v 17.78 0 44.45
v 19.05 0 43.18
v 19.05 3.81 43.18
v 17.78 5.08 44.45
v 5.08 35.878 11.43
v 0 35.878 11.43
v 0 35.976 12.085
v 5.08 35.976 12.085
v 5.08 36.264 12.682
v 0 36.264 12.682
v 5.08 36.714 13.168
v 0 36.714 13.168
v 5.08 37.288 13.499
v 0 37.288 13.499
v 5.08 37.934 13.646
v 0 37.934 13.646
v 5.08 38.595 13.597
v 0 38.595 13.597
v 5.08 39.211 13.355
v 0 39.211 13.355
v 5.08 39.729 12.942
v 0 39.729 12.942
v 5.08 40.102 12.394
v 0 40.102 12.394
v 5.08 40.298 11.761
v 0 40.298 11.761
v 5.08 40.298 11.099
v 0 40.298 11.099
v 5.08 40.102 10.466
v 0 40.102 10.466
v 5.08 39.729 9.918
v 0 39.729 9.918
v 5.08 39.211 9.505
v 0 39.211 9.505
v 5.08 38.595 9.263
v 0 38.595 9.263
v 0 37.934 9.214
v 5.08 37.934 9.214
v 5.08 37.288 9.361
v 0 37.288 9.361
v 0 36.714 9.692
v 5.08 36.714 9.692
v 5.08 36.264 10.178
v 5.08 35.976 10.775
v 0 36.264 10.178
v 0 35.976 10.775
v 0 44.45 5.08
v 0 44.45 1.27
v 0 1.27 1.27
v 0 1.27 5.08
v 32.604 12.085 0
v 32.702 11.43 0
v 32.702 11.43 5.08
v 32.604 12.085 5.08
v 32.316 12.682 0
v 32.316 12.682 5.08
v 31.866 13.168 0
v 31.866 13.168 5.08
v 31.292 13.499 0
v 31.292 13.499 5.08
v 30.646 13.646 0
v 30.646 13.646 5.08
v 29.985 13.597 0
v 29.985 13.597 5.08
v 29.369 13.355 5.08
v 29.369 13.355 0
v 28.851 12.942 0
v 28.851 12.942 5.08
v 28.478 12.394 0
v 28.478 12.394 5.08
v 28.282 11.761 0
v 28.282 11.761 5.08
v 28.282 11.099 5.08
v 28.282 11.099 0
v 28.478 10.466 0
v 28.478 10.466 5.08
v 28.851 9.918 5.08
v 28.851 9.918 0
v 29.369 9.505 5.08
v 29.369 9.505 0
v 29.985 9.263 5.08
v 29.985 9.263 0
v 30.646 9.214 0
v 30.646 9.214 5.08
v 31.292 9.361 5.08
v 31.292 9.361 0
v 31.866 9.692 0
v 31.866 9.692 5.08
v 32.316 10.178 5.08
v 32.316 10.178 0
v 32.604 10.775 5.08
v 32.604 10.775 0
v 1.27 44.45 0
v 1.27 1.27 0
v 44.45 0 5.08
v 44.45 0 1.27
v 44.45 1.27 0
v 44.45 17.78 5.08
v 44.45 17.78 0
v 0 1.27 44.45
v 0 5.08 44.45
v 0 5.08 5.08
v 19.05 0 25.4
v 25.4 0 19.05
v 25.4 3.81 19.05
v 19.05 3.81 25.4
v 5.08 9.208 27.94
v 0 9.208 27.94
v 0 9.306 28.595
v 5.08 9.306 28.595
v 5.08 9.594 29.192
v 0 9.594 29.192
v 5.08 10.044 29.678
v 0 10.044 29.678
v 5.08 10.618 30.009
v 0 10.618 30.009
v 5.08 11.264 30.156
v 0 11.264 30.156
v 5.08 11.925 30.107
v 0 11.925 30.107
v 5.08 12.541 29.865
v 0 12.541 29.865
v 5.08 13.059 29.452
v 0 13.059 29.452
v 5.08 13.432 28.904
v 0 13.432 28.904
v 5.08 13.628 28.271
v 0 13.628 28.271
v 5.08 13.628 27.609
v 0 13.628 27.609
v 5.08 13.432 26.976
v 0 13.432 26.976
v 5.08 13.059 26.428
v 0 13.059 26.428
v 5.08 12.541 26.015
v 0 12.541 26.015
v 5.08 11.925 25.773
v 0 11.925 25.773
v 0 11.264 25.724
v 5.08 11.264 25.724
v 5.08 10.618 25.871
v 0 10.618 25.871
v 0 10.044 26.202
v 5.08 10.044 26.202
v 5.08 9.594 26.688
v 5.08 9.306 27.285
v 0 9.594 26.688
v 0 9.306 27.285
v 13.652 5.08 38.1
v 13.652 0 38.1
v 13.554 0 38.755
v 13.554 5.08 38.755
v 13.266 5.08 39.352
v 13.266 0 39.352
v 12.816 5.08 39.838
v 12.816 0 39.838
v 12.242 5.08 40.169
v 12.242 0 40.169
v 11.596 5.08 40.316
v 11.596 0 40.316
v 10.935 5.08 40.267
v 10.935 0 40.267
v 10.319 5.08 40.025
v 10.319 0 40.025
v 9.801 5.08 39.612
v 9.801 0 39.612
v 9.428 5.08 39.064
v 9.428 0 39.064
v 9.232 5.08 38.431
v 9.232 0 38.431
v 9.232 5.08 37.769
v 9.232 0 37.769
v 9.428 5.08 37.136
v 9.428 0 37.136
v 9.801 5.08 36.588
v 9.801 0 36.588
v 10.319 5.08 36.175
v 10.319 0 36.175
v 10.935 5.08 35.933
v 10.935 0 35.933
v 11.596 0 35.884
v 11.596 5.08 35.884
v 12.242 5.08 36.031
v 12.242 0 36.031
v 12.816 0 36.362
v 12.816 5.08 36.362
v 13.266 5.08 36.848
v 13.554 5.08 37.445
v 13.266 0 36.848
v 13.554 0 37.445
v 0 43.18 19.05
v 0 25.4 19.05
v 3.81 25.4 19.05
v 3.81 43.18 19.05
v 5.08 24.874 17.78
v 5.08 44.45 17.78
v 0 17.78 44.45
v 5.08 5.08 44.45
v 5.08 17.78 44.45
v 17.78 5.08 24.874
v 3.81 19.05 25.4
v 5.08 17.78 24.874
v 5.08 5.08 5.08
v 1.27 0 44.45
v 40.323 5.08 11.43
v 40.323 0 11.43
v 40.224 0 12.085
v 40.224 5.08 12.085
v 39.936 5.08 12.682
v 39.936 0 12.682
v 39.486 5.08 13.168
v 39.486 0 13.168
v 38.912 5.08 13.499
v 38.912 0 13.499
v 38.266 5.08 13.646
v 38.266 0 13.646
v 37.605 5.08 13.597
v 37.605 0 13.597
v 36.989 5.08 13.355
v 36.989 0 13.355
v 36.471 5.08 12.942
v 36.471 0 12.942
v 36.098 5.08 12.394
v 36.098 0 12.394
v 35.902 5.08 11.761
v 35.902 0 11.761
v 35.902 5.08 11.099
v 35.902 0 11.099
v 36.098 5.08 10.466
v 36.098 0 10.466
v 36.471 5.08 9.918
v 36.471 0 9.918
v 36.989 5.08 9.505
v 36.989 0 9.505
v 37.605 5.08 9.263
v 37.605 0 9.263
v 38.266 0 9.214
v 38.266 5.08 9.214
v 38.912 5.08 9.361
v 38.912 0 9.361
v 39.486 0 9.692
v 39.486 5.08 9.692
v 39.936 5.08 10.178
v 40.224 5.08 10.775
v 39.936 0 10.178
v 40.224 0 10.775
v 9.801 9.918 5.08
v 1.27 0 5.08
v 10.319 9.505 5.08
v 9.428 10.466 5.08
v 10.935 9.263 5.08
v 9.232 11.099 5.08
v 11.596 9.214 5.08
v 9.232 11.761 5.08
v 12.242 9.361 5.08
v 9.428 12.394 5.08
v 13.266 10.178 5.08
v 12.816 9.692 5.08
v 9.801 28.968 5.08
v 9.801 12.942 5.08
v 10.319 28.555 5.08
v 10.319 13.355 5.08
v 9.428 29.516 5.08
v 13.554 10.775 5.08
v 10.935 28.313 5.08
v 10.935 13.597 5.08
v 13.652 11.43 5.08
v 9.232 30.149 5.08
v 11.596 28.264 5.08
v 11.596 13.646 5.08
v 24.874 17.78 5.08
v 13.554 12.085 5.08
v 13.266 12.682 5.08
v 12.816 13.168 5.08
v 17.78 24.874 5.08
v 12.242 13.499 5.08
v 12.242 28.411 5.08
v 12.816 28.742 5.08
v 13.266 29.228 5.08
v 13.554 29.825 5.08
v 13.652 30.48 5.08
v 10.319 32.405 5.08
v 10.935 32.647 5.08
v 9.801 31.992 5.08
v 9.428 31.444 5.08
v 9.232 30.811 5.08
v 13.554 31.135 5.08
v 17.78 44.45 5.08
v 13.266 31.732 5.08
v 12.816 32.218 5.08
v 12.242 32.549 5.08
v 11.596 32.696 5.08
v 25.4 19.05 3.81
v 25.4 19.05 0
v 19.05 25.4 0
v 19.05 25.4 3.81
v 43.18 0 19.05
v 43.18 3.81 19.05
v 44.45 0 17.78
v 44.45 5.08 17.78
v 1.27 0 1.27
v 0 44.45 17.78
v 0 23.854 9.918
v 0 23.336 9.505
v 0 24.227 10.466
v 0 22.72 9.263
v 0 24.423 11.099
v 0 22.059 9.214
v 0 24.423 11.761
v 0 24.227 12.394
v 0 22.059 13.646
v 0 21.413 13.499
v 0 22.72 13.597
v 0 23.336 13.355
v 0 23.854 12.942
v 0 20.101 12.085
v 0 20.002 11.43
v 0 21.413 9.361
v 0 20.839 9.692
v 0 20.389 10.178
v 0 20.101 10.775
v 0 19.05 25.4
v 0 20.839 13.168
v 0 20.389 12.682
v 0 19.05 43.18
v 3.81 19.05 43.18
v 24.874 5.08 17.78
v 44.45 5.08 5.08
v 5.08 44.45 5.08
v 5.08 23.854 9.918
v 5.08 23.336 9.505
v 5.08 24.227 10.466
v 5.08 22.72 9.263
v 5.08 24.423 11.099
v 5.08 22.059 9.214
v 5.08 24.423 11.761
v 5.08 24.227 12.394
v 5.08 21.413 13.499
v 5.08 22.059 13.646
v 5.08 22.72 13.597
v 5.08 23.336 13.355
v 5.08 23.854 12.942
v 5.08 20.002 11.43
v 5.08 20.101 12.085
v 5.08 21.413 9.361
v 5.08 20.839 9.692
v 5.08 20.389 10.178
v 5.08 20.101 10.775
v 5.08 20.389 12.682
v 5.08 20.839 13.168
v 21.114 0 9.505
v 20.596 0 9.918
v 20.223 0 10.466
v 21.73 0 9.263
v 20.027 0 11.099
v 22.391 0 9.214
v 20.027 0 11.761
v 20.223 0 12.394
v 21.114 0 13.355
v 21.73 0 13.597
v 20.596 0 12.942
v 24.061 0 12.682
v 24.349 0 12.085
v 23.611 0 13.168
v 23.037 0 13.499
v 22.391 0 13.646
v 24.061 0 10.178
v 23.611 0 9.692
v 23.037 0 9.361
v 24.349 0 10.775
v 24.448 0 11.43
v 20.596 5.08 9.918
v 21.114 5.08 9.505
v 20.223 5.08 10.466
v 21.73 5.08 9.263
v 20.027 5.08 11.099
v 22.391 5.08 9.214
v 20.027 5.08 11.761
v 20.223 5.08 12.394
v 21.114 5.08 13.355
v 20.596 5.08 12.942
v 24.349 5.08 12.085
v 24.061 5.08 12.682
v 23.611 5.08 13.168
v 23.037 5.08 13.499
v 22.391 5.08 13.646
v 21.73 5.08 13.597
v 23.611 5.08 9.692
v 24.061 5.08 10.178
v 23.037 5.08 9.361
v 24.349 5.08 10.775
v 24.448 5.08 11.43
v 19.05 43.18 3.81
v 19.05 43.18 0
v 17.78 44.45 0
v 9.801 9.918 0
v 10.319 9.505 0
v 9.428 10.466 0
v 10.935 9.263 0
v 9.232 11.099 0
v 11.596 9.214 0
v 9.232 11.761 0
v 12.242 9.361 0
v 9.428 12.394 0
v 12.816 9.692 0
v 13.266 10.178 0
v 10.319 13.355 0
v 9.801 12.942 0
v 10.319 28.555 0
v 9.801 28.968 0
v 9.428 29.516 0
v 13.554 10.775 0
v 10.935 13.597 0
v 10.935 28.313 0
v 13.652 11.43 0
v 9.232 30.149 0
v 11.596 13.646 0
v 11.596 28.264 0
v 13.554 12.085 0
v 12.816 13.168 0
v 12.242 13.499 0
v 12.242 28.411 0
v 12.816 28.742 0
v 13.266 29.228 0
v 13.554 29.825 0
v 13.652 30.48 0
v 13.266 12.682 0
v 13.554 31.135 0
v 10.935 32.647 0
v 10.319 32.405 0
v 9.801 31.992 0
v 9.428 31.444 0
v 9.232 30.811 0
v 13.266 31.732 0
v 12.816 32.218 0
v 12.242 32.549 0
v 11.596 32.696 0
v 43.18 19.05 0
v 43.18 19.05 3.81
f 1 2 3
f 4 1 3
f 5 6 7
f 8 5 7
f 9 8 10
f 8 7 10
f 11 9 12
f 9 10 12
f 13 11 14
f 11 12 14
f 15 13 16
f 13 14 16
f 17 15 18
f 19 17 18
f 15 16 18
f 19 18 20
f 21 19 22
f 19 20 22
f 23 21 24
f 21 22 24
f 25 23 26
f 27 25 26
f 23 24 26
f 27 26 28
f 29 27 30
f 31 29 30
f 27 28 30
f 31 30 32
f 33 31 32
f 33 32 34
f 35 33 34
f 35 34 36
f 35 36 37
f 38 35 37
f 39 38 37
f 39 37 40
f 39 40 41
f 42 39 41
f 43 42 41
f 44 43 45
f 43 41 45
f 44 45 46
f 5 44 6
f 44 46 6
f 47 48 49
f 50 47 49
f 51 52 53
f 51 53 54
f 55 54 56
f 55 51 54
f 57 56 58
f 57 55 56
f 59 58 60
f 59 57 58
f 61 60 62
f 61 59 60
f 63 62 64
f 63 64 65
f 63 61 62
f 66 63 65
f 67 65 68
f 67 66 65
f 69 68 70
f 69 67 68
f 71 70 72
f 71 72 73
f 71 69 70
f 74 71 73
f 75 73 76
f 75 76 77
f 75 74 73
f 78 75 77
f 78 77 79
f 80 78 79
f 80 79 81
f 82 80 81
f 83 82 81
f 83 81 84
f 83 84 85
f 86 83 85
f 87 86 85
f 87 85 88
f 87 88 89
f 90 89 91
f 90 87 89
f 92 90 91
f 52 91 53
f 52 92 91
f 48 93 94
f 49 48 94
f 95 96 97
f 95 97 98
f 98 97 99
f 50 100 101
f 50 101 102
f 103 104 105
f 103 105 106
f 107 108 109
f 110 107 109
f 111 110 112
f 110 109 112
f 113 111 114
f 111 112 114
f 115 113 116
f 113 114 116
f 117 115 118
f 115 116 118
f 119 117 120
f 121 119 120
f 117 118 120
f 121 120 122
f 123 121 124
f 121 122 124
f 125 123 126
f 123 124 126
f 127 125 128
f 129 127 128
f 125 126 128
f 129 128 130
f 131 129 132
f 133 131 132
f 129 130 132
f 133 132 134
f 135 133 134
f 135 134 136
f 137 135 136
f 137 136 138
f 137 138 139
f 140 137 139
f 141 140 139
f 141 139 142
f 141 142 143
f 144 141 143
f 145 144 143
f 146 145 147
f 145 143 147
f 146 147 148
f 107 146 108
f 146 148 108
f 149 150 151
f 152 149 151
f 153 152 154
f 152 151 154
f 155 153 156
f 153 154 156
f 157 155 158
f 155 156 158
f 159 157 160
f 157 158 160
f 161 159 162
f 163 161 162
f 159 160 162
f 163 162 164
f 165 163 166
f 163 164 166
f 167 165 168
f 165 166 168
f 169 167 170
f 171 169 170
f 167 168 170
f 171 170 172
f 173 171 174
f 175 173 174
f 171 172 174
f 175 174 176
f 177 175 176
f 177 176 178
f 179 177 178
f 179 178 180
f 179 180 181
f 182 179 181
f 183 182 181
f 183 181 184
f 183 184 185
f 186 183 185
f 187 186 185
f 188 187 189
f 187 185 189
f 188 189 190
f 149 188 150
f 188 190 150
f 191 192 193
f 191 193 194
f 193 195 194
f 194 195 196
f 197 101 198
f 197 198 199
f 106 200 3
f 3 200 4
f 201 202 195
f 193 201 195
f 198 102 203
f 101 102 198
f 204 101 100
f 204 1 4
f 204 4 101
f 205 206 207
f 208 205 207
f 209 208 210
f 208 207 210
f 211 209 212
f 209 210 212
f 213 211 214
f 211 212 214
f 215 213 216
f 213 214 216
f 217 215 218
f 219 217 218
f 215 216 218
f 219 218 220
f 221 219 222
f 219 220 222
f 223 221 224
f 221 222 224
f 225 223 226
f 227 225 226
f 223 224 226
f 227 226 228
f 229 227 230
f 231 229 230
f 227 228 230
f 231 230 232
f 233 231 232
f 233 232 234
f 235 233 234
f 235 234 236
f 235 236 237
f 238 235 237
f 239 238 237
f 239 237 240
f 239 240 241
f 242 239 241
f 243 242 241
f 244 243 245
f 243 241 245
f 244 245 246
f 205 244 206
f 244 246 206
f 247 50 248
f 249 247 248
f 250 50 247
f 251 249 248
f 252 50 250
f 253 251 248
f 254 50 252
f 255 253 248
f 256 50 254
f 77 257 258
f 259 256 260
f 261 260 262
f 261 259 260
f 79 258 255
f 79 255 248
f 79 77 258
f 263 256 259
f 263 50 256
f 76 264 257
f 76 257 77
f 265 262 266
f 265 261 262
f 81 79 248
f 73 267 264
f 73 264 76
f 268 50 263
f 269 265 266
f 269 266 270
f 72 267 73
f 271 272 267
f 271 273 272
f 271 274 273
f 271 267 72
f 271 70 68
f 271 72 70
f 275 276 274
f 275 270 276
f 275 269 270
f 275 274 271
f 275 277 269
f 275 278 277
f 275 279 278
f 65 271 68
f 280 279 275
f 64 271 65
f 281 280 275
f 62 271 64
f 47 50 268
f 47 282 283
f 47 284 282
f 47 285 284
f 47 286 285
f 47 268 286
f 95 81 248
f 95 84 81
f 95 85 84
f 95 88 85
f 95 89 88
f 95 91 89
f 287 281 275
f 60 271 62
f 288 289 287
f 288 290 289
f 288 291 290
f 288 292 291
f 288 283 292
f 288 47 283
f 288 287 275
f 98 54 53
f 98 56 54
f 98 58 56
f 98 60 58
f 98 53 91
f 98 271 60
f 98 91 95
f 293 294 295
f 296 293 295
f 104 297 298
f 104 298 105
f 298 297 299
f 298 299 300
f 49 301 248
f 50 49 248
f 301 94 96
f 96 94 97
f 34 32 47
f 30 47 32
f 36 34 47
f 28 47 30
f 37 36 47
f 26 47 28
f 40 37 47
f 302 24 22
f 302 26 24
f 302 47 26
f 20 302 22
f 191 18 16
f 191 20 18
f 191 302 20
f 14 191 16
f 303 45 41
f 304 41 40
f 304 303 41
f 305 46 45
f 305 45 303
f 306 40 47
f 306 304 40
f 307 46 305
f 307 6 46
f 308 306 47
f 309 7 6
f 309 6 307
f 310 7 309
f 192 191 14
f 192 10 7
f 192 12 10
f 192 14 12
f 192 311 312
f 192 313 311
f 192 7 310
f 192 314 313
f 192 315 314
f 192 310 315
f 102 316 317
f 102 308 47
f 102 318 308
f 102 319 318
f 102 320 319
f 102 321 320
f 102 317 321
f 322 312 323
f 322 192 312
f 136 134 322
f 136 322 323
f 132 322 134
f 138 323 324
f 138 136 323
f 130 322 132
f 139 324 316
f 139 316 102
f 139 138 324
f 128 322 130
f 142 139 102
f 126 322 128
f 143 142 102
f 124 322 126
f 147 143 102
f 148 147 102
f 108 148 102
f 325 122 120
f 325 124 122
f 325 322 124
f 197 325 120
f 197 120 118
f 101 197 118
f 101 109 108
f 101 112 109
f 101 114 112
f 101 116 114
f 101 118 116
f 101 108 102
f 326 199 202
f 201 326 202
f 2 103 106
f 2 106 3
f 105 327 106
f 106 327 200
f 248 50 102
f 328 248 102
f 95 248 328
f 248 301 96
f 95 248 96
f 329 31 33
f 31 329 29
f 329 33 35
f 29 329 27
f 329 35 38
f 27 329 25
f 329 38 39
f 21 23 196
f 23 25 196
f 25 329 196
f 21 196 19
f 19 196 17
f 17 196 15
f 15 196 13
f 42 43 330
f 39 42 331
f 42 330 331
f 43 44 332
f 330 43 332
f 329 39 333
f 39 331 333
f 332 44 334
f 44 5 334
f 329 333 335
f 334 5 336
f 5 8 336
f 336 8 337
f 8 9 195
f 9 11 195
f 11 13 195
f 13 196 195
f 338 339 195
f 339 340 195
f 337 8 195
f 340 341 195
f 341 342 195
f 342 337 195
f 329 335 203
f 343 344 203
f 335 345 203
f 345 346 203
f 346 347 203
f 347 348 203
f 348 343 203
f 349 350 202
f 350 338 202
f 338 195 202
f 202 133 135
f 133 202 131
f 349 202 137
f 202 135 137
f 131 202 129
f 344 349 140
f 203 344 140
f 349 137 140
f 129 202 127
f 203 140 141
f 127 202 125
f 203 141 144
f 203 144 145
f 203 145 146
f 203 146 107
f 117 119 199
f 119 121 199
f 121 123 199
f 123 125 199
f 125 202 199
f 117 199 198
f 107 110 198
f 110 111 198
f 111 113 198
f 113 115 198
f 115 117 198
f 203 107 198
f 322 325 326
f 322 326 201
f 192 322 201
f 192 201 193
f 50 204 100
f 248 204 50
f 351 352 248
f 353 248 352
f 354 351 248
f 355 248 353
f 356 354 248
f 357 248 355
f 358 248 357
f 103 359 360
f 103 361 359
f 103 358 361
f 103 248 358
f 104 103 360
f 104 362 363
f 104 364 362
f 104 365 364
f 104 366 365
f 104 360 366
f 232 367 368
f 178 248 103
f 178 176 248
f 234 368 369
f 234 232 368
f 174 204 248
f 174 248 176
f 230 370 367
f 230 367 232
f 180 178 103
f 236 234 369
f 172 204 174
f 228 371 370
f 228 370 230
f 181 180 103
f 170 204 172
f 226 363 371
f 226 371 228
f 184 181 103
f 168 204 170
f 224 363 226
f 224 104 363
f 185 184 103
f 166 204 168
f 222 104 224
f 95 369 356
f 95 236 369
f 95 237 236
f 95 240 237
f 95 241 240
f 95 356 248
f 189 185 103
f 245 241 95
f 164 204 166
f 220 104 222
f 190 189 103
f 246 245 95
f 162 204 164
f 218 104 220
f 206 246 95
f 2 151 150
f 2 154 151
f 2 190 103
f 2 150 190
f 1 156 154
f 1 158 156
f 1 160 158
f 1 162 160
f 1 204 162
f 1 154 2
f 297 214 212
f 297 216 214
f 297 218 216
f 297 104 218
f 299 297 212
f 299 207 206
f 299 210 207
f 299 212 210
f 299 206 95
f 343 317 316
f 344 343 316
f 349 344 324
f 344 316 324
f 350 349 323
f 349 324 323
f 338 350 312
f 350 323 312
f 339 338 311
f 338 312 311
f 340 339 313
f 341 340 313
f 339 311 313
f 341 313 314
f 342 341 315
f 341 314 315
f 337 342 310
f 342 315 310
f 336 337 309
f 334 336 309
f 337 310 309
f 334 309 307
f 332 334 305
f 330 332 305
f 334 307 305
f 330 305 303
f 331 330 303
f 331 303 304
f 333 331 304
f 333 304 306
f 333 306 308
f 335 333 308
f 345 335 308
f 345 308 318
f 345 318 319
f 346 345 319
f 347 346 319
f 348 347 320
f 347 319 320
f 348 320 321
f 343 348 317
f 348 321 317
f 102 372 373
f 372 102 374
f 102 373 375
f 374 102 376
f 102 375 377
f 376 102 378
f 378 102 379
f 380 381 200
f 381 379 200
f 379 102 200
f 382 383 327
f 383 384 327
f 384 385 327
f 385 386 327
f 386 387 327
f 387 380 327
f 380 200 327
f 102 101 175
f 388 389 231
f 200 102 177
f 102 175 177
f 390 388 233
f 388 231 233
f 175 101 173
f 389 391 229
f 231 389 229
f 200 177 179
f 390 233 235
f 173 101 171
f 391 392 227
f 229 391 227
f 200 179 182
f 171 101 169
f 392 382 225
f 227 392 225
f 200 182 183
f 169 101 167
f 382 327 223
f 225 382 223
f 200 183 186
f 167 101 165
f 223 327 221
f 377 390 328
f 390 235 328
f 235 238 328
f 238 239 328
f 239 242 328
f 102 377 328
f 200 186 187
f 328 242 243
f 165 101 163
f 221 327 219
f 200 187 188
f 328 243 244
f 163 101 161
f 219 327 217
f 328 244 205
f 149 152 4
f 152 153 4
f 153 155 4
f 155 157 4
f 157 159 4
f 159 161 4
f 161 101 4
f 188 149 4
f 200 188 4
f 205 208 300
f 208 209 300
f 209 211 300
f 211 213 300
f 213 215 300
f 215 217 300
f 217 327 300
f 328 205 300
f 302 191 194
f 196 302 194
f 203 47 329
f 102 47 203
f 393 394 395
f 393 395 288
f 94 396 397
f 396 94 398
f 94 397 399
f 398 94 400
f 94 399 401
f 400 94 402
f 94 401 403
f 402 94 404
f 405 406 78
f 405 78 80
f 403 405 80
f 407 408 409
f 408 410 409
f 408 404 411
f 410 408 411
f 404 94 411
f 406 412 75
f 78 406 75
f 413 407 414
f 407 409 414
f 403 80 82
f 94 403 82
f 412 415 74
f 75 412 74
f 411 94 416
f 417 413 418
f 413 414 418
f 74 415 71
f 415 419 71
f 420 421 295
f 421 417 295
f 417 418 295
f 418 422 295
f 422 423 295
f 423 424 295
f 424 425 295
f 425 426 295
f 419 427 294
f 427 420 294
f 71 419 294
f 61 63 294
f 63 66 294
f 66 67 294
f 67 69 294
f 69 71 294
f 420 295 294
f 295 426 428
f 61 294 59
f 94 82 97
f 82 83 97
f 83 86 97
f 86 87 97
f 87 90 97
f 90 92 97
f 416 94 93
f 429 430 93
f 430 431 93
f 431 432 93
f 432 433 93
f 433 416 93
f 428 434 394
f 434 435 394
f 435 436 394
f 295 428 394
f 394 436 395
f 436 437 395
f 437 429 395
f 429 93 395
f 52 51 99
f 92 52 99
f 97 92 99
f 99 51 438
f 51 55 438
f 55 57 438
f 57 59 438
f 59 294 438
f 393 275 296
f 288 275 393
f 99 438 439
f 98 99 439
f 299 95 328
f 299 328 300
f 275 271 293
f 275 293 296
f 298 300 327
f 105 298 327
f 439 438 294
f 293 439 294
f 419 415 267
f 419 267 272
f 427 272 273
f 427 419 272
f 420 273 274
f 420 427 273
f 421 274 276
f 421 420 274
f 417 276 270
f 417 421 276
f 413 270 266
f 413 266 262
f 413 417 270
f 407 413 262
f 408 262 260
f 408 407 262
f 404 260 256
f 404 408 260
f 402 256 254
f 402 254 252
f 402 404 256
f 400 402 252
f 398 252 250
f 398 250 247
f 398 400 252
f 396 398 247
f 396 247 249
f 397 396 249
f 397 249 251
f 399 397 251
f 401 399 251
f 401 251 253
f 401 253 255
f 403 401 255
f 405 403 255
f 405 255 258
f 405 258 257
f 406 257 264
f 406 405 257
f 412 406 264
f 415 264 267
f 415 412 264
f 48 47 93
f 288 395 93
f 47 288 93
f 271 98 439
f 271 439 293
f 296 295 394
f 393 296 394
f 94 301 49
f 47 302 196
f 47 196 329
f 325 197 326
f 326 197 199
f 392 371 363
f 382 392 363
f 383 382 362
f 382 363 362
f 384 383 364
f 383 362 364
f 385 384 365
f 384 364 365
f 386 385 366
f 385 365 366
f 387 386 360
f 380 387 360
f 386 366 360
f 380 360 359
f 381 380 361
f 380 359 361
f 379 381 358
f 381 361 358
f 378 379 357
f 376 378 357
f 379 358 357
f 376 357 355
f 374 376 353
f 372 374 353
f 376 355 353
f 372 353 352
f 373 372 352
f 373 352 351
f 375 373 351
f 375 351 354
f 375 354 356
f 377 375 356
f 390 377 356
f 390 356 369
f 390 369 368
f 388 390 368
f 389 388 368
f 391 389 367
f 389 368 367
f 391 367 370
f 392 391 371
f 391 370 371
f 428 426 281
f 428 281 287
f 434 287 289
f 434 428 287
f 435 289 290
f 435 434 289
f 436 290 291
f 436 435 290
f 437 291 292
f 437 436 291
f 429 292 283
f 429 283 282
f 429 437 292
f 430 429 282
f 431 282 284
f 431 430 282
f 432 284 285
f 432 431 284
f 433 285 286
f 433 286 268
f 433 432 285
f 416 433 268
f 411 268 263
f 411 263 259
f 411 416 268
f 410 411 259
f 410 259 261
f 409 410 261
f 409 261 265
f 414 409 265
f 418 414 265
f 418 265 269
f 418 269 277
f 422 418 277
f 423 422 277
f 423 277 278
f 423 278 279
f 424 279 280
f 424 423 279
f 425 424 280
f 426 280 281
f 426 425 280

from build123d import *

# Parameters (mm, degrees)
F0_R      = 2.2225
F1_DEPTH  = 5.08
F2_R      = 2.2225
F3_DEPTH  = 5.08
F4_R      = 2.2225
F5_DEPTH  = 5.08
F6_SIZE   = 1.27
F6_2_SIZE = 1.27
F6_3_SIZE = 1.27


with BuildPart() as f1:
    # F0 (on Top) → F1 (new body)
    with BuildSketch(Plane.XY):
        Polygon((0, 44.45), (0, 0), (44.45, 0), (44.45, 19.05), (25.4, 19.05), (19.05, 25.4), (19.05, 44.45), align=None)
        with Locations((11.43, 11.43)):
            Circle(F0_R, mode=Mode.SUBTRACT)
        with Locations((30.48, 11.43)):
            Circle(F0_R, mode=Mode.SUBTRACT)
        with Locations((11.43, 30.48)):
            Circle(F0_R, mode=Mode.SUBTRACT)
    extrude(amount=F1_DEPTH)

    # F6
    f6_edges = [f1.edges().sort_by_distance(p)[0] for p in [
        (19.05, 34.925, 5.08),
        (19.05, 44.45, 2.54),
        (34.925, 19.05, 5.08),
        (22.225, 22.225, 5.08),
        (44.45, 19.05, 2.54),
        (22.225, 0, 0),
        (0, 0, 2.54),
        (0, 22.225, 0),
    ]]
    chamfer(f6_edges, length=F6_SIZE)


with BuildPart() as f3:
    # F2 (on face) → F3 (new body)
    with BuildSketch(Plane.XZ):
        Polygon((0, 44.45), (0, 5.08), (44.45, 5.08), (44.45, 19.05), (25.4, 19.05), (19.05, 25.4), (19.05, 44.45), align=None)
        with Locations((22.225, 11.43)):
            Circle(F2_R, mode=Mode.SUBTRACT)
        with Locations((38.1, 11.43)):
            Circle(F2_R, mode=Mode.SUBTRACT)
        with Locations((11.43, 38.1)):
            Circle(F2_R, mode=Mode.SUBTRACT)
    extrude(amount=-F3_DEPTH)

    # F6#3
    f6_3_edges = [f3.edges().sort_by_distance(p)[0] for p in [
        (19.05, 5.08, 34.925),
        (22.225, 5.08, 22.225),
        (34.925, 5.08, 19.05),
        (44.45, 2.54, 19.05),
        (19.05, 2.54, 44.45),
        (0, 0, 24.765),
    ]]
    chamfer(f6_3_edges, length=F6_3_SIZE)


with BuildPart() as f5:
    # F4 (on face) → F5 (new body)
    with BuildSketch(Plane(origin=(0, 0, 0), x_dir=(0, -1, 0), z_dir=(-1, 0, 0))):
        Polygon((-44.45, 19.05), (-44.45, 5.08), (-5.08, 5.08), (-5.08, 44.45), (-19.05, 44.45), (-19.05, 25.4), (-25.4, 19.05), align=None)
        with Locations((-38.1, 11.43)):
            Circle(F4_R, mode=Mode.SUBTRACT)
        with Locations((-22.225, 11.43)):
            Circle(F4_R, mode=Mode.SUBTRACT)
        with Locations((-11.43, 27.94)):
            Circle(F4_R, mode=Mode.SUBTRACT)
    extrude(amount=-F5_DEPTH)

    # F6#2
    f6_2_edges = [f5.edges().sort_by_distance(p)[0] for p in [
        (2.54, 44.45, 19.05),
        (5.08, 34.925, 19.05),
        (5.08, 19.05, 34.925),
        (5.08, 22.225, 22.225),
        (2.54, 19.05, 44.45),
    ]]
    chamfer(f6_2_edges, length=F6_2_SIZE)


solid = Compound([f1.part, f3.part, f5.part])
